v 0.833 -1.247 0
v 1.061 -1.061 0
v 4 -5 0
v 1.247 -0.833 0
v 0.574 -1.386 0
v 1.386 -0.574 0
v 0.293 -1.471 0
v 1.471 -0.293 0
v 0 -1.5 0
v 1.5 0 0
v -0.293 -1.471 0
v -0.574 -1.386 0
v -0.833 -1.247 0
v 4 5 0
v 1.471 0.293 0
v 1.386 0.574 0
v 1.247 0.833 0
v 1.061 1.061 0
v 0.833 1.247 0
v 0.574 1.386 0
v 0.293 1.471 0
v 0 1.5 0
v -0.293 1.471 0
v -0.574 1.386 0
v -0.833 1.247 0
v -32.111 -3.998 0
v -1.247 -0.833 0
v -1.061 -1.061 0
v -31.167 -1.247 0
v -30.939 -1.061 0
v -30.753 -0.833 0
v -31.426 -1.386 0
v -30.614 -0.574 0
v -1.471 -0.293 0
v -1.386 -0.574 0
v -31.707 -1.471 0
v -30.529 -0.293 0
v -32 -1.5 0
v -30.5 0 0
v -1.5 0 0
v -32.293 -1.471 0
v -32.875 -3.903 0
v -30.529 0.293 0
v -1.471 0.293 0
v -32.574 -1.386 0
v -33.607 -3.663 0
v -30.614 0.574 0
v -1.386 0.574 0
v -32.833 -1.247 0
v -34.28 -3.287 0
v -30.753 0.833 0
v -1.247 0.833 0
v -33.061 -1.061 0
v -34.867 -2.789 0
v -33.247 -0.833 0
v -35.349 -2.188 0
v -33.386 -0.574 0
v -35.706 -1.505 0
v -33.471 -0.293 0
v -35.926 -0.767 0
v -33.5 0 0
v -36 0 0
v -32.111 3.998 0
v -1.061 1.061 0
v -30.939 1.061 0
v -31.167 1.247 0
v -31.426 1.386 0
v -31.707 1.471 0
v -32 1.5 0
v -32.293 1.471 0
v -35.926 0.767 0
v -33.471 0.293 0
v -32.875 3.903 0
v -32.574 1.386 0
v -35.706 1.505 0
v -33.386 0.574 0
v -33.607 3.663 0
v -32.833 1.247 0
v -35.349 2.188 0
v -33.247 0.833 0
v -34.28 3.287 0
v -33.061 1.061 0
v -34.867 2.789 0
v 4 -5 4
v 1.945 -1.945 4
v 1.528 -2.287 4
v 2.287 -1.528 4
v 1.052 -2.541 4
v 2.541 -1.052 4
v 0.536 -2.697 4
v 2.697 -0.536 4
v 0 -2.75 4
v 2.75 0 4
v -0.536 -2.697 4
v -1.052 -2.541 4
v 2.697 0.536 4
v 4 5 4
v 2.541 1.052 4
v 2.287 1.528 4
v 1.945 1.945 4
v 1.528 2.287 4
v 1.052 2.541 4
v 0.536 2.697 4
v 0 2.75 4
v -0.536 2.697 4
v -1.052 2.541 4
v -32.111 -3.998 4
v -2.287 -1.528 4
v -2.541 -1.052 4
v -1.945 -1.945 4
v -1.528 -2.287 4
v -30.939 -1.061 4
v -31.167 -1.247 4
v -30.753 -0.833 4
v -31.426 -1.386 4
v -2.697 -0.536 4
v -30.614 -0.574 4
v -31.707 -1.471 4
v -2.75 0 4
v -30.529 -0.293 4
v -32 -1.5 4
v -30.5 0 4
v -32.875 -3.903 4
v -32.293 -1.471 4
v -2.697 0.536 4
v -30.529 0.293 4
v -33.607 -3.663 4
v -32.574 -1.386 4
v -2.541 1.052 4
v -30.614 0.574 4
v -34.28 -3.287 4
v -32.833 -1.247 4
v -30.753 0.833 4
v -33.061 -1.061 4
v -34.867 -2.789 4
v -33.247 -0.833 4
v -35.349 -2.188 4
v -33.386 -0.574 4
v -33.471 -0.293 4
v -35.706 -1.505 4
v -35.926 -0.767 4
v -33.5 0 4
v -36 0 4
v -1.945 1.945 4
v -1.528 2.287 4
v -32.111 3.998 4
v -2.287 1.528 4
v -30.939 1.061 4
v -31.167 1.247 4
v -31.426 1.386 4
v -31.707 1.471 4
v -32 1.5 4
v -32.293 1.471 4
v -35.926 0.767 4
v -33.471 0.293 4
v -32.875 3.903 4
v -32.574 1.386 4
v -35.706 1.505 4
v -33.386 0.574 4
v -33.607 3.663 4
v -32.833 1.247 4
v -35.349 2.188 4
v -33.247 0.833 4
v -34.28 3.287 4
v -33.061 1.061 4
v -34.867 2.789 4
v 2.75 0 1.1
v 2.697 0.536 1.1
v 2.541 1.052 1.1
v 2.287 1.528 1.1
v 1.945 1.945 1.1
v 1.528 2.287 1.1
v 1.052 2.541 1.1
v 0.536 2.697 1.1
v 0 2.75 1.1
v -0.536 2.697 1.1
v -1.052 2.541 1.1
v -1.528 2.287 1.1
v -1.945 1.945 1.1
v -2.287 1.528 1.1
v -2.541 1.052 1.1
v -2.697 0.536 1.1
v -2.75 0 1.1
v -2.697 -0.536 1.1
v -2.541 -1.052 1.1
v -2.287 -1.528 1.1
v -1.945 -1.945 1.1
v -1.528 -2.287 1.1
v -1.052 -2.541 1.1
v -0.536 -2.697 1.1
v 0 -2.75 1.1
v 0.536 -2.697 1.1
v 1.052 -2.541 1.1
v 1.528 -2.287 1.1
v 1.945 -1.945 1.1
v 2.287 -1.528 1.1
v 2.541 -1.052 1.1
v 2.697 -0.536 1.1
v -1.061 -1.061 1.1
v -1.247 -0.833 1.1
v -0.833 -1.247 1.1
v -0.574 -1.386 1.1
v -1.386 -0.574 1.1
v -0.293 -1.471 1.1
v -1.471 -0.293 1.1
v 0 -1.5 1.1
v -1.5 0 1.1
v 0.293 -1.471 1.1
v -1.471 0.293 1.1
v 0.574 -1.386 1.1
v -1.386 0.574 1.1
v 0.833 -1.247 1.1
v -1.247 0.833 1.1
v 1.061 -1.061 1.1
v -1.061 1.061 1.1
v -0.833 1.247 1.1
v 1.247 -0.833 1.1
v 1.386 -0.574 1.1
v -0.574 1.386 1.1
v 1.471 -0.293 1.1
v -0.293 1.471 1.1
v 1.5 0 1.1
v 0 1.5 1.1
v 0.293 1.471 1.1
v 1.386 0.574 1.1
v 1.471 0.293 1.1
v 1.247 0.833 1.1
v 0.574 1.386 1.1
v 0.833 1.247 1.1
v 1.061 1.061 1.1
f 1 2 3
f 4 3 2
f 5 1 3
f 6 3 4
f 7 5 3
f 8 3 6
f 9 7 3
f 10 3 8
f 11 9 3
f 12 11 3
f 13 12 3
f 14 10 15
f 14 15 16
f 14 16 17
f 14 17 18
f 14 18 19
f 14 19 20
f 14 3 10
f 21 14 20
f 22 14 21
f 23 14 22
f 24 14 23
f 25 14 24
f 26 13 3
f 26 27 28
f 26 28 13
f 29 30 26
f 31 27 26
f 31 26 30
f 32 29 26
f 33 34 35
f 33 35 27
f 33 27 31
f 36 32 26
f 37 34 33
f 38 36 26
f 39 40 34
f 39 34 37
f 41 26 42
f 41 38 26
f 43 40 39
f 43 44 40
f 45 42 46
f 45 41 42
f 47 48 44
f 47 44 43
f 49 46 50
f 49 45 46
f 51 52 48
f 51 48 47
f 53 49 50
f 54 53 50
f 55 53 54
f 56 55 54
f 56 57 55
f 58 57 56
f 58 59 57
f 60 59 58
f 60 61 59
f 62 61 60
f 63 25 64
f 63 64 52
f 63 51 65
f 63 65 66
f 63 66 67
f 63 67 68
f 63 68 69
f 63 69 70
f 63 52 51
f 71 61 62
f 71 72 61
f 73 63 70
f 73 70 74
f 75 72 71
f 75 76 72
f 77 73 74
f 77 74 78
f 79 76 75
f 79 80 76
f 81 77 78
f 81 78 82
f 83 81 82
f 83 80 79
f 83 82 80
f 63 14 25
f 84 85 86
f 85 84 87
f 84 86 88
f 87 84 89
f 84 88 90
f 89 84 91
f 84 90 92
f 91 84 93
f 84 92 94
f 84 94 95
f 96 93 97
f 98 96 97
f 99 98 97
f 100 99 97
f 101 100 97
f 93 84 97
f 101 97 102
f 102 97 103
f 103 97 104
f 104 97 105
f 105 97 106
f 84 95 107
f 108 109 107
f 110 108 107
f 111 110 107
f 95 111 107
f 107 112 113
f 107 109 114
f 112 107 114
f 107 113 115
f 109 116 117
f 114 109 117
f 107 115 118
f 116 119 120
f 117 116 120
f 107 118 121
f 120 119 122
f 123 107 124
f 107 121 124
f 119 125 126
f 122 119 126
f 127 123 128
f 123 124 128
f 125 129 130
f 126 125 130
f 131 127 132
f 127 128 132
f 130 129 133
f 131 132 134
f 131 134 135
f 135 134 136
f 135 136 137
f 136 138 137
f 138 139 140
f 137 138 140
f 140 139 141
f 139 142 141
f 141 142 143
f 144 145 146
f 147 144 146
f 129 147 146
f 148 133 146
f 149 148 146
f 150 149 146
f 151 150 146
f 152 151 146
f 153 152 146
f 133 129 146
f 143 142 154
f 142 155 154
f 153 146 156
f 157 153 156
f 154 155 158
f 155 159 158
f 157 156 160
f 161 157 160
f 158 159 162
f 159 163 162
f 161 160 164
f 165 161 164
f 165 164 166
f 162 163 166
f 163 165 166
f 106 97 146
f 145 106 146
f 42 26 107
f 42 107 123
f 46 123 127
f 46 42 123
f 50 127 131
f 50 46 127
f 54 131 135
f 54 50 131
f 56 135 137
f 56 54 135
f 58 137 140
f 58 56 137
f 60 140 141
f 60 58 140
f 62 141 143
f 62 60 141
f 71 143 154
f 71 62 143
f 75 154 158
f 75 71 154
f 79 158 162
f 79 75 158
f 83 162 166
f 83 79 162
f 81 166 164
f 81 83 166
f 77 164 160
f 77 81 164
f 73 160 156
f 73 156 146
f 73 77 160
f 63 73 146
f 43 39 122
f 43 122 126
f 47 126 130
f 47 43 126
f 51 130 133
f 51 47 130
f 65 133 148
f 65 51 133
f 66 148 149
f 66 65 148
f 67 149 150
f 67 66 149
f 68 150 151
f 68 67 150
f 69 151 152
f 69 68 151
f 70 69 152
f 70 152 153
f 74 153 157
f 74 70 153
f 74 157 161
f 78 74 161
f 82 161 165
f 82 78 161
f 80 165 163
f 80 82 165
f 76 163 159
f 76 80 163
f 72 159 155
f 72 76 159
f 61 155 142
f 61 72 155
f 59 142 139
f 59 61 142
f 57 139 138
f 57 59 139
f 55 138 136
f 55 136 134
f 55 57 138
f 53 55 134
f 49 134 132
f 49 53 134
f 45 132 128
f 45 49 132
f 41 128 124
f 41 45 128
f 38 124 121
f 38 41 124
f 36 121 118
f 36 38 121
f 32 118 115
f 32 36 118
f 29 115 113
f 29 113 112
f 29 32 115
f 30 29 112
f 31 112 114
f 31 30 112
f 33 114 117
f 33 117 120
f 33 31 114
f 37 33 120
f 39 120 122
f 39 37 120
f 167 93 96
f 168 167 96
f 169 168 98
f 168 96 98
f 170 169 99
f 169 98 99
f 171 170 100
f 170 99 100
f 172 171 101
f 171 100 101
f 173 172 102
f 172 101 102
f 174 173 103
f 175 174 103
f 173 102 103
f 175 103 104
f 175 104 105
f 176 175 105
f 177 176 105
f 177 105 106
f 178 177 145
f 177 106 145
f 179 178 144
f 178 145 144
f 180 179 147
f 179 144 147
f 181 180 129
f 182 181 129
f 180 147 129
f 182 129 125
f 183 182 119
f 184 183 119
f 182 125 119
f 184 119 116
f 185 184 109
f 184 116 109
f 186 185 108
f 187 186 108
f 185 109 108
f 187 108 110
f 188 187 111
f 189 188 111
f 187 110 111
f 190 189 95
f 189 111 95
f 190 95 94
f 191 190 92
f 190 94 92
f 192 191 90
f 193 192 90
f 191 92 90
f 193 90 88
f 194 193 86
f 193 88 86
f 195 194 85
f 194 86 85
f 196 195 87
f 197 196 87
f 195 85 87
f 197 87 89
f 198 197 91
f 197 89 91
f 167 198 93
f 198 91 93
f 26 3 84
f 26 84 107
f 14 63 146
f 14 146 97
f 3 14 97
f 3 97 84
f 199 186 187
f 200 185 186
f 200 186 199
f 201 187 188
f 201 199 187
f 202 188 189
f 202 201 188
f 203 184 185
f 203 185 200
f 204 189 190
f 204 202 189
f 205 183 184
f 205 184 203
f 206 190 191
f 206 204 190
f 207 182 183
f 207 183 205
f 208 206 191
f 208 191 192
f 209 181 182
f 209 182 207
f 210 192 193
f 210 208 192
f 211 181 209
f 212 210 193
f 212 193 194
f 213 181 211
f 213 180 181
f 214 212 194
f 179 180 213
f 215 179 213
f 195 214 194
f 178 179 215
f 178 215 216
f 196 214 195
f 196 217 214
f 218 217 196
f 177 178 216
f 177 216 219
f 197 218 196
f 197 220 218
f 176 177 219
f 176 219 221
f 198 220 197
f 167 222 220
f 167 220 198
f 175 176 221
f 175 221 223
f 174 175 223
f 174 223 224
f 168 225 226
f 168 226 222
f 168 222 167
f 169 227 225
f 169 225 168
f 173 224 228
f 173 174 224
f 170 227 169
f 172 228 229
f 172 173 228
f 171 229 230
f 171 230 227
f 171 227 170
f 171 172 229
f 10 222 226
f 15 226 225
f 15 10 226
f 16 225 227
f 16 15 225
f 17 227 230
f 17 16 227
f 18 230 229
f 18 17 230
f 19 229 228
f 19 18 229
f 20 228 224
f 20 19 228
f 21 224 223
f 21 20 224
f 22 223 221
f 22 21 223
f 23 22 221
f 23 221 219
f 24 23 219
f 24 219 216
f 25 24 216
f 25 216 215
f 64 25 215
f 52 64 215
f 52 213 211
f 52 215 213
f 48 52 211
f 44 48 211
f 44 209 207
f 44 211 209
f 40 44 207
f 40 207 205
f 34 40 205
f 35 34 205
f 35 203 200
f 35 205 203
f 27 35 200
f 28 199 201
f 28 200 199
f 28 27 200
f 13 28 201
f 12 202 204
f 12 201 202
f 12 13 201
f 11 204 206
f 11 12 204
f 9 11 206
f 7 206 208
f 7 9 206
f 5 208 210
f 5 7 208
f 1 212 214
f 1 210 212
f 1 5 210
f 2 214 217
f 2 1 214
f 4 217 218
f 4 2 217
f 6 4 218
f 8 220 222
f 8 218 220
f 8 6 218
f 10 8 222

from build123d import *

# Parameters (mm, degrees)
SKETCH_1_R          = 1.5
EXTRUDE_1_DEPTH     = 4
SKETCH_2_R          = 2.75
CUT_EXTRUDE_1_DEPTH = 2.9


with BuildPart() as part:
    # 草图1 → 凸台-拉伸1 (new body)
    with BuildSketch(Plane.XY):
        with BuildLine():
            Line((-32.110897558, 3.998462421), (4, 5))
            Line((4, 5), (4, -5))
            Line((4, -5), (-32.110897558, -3.998462421))
            ThreePointArc((-32.110897558, -3.998462421), (-36, 0), (-32.110897558, 3.998462421))
        make_face()
        Circle(SKETCH_1_R, mode=Mode.SUBTRACT)
        with Locations((-32, 0)):
            Circle(SKETCH_1_R, mode=Mode.SUBTRACT)
    extrude(amount=EXTRUDE_1_DEPTH)

    # 草图2 → 切除-拉伸1 (cut)
    with BuildSketch(Plane.XY.offset(4)):
        Circle(SKETCH_2_R)
    extrude(amount=-CUT_EXTRUDE_1_DEPTH, mode=Mode.SUBTRACT)


solid = part.part
